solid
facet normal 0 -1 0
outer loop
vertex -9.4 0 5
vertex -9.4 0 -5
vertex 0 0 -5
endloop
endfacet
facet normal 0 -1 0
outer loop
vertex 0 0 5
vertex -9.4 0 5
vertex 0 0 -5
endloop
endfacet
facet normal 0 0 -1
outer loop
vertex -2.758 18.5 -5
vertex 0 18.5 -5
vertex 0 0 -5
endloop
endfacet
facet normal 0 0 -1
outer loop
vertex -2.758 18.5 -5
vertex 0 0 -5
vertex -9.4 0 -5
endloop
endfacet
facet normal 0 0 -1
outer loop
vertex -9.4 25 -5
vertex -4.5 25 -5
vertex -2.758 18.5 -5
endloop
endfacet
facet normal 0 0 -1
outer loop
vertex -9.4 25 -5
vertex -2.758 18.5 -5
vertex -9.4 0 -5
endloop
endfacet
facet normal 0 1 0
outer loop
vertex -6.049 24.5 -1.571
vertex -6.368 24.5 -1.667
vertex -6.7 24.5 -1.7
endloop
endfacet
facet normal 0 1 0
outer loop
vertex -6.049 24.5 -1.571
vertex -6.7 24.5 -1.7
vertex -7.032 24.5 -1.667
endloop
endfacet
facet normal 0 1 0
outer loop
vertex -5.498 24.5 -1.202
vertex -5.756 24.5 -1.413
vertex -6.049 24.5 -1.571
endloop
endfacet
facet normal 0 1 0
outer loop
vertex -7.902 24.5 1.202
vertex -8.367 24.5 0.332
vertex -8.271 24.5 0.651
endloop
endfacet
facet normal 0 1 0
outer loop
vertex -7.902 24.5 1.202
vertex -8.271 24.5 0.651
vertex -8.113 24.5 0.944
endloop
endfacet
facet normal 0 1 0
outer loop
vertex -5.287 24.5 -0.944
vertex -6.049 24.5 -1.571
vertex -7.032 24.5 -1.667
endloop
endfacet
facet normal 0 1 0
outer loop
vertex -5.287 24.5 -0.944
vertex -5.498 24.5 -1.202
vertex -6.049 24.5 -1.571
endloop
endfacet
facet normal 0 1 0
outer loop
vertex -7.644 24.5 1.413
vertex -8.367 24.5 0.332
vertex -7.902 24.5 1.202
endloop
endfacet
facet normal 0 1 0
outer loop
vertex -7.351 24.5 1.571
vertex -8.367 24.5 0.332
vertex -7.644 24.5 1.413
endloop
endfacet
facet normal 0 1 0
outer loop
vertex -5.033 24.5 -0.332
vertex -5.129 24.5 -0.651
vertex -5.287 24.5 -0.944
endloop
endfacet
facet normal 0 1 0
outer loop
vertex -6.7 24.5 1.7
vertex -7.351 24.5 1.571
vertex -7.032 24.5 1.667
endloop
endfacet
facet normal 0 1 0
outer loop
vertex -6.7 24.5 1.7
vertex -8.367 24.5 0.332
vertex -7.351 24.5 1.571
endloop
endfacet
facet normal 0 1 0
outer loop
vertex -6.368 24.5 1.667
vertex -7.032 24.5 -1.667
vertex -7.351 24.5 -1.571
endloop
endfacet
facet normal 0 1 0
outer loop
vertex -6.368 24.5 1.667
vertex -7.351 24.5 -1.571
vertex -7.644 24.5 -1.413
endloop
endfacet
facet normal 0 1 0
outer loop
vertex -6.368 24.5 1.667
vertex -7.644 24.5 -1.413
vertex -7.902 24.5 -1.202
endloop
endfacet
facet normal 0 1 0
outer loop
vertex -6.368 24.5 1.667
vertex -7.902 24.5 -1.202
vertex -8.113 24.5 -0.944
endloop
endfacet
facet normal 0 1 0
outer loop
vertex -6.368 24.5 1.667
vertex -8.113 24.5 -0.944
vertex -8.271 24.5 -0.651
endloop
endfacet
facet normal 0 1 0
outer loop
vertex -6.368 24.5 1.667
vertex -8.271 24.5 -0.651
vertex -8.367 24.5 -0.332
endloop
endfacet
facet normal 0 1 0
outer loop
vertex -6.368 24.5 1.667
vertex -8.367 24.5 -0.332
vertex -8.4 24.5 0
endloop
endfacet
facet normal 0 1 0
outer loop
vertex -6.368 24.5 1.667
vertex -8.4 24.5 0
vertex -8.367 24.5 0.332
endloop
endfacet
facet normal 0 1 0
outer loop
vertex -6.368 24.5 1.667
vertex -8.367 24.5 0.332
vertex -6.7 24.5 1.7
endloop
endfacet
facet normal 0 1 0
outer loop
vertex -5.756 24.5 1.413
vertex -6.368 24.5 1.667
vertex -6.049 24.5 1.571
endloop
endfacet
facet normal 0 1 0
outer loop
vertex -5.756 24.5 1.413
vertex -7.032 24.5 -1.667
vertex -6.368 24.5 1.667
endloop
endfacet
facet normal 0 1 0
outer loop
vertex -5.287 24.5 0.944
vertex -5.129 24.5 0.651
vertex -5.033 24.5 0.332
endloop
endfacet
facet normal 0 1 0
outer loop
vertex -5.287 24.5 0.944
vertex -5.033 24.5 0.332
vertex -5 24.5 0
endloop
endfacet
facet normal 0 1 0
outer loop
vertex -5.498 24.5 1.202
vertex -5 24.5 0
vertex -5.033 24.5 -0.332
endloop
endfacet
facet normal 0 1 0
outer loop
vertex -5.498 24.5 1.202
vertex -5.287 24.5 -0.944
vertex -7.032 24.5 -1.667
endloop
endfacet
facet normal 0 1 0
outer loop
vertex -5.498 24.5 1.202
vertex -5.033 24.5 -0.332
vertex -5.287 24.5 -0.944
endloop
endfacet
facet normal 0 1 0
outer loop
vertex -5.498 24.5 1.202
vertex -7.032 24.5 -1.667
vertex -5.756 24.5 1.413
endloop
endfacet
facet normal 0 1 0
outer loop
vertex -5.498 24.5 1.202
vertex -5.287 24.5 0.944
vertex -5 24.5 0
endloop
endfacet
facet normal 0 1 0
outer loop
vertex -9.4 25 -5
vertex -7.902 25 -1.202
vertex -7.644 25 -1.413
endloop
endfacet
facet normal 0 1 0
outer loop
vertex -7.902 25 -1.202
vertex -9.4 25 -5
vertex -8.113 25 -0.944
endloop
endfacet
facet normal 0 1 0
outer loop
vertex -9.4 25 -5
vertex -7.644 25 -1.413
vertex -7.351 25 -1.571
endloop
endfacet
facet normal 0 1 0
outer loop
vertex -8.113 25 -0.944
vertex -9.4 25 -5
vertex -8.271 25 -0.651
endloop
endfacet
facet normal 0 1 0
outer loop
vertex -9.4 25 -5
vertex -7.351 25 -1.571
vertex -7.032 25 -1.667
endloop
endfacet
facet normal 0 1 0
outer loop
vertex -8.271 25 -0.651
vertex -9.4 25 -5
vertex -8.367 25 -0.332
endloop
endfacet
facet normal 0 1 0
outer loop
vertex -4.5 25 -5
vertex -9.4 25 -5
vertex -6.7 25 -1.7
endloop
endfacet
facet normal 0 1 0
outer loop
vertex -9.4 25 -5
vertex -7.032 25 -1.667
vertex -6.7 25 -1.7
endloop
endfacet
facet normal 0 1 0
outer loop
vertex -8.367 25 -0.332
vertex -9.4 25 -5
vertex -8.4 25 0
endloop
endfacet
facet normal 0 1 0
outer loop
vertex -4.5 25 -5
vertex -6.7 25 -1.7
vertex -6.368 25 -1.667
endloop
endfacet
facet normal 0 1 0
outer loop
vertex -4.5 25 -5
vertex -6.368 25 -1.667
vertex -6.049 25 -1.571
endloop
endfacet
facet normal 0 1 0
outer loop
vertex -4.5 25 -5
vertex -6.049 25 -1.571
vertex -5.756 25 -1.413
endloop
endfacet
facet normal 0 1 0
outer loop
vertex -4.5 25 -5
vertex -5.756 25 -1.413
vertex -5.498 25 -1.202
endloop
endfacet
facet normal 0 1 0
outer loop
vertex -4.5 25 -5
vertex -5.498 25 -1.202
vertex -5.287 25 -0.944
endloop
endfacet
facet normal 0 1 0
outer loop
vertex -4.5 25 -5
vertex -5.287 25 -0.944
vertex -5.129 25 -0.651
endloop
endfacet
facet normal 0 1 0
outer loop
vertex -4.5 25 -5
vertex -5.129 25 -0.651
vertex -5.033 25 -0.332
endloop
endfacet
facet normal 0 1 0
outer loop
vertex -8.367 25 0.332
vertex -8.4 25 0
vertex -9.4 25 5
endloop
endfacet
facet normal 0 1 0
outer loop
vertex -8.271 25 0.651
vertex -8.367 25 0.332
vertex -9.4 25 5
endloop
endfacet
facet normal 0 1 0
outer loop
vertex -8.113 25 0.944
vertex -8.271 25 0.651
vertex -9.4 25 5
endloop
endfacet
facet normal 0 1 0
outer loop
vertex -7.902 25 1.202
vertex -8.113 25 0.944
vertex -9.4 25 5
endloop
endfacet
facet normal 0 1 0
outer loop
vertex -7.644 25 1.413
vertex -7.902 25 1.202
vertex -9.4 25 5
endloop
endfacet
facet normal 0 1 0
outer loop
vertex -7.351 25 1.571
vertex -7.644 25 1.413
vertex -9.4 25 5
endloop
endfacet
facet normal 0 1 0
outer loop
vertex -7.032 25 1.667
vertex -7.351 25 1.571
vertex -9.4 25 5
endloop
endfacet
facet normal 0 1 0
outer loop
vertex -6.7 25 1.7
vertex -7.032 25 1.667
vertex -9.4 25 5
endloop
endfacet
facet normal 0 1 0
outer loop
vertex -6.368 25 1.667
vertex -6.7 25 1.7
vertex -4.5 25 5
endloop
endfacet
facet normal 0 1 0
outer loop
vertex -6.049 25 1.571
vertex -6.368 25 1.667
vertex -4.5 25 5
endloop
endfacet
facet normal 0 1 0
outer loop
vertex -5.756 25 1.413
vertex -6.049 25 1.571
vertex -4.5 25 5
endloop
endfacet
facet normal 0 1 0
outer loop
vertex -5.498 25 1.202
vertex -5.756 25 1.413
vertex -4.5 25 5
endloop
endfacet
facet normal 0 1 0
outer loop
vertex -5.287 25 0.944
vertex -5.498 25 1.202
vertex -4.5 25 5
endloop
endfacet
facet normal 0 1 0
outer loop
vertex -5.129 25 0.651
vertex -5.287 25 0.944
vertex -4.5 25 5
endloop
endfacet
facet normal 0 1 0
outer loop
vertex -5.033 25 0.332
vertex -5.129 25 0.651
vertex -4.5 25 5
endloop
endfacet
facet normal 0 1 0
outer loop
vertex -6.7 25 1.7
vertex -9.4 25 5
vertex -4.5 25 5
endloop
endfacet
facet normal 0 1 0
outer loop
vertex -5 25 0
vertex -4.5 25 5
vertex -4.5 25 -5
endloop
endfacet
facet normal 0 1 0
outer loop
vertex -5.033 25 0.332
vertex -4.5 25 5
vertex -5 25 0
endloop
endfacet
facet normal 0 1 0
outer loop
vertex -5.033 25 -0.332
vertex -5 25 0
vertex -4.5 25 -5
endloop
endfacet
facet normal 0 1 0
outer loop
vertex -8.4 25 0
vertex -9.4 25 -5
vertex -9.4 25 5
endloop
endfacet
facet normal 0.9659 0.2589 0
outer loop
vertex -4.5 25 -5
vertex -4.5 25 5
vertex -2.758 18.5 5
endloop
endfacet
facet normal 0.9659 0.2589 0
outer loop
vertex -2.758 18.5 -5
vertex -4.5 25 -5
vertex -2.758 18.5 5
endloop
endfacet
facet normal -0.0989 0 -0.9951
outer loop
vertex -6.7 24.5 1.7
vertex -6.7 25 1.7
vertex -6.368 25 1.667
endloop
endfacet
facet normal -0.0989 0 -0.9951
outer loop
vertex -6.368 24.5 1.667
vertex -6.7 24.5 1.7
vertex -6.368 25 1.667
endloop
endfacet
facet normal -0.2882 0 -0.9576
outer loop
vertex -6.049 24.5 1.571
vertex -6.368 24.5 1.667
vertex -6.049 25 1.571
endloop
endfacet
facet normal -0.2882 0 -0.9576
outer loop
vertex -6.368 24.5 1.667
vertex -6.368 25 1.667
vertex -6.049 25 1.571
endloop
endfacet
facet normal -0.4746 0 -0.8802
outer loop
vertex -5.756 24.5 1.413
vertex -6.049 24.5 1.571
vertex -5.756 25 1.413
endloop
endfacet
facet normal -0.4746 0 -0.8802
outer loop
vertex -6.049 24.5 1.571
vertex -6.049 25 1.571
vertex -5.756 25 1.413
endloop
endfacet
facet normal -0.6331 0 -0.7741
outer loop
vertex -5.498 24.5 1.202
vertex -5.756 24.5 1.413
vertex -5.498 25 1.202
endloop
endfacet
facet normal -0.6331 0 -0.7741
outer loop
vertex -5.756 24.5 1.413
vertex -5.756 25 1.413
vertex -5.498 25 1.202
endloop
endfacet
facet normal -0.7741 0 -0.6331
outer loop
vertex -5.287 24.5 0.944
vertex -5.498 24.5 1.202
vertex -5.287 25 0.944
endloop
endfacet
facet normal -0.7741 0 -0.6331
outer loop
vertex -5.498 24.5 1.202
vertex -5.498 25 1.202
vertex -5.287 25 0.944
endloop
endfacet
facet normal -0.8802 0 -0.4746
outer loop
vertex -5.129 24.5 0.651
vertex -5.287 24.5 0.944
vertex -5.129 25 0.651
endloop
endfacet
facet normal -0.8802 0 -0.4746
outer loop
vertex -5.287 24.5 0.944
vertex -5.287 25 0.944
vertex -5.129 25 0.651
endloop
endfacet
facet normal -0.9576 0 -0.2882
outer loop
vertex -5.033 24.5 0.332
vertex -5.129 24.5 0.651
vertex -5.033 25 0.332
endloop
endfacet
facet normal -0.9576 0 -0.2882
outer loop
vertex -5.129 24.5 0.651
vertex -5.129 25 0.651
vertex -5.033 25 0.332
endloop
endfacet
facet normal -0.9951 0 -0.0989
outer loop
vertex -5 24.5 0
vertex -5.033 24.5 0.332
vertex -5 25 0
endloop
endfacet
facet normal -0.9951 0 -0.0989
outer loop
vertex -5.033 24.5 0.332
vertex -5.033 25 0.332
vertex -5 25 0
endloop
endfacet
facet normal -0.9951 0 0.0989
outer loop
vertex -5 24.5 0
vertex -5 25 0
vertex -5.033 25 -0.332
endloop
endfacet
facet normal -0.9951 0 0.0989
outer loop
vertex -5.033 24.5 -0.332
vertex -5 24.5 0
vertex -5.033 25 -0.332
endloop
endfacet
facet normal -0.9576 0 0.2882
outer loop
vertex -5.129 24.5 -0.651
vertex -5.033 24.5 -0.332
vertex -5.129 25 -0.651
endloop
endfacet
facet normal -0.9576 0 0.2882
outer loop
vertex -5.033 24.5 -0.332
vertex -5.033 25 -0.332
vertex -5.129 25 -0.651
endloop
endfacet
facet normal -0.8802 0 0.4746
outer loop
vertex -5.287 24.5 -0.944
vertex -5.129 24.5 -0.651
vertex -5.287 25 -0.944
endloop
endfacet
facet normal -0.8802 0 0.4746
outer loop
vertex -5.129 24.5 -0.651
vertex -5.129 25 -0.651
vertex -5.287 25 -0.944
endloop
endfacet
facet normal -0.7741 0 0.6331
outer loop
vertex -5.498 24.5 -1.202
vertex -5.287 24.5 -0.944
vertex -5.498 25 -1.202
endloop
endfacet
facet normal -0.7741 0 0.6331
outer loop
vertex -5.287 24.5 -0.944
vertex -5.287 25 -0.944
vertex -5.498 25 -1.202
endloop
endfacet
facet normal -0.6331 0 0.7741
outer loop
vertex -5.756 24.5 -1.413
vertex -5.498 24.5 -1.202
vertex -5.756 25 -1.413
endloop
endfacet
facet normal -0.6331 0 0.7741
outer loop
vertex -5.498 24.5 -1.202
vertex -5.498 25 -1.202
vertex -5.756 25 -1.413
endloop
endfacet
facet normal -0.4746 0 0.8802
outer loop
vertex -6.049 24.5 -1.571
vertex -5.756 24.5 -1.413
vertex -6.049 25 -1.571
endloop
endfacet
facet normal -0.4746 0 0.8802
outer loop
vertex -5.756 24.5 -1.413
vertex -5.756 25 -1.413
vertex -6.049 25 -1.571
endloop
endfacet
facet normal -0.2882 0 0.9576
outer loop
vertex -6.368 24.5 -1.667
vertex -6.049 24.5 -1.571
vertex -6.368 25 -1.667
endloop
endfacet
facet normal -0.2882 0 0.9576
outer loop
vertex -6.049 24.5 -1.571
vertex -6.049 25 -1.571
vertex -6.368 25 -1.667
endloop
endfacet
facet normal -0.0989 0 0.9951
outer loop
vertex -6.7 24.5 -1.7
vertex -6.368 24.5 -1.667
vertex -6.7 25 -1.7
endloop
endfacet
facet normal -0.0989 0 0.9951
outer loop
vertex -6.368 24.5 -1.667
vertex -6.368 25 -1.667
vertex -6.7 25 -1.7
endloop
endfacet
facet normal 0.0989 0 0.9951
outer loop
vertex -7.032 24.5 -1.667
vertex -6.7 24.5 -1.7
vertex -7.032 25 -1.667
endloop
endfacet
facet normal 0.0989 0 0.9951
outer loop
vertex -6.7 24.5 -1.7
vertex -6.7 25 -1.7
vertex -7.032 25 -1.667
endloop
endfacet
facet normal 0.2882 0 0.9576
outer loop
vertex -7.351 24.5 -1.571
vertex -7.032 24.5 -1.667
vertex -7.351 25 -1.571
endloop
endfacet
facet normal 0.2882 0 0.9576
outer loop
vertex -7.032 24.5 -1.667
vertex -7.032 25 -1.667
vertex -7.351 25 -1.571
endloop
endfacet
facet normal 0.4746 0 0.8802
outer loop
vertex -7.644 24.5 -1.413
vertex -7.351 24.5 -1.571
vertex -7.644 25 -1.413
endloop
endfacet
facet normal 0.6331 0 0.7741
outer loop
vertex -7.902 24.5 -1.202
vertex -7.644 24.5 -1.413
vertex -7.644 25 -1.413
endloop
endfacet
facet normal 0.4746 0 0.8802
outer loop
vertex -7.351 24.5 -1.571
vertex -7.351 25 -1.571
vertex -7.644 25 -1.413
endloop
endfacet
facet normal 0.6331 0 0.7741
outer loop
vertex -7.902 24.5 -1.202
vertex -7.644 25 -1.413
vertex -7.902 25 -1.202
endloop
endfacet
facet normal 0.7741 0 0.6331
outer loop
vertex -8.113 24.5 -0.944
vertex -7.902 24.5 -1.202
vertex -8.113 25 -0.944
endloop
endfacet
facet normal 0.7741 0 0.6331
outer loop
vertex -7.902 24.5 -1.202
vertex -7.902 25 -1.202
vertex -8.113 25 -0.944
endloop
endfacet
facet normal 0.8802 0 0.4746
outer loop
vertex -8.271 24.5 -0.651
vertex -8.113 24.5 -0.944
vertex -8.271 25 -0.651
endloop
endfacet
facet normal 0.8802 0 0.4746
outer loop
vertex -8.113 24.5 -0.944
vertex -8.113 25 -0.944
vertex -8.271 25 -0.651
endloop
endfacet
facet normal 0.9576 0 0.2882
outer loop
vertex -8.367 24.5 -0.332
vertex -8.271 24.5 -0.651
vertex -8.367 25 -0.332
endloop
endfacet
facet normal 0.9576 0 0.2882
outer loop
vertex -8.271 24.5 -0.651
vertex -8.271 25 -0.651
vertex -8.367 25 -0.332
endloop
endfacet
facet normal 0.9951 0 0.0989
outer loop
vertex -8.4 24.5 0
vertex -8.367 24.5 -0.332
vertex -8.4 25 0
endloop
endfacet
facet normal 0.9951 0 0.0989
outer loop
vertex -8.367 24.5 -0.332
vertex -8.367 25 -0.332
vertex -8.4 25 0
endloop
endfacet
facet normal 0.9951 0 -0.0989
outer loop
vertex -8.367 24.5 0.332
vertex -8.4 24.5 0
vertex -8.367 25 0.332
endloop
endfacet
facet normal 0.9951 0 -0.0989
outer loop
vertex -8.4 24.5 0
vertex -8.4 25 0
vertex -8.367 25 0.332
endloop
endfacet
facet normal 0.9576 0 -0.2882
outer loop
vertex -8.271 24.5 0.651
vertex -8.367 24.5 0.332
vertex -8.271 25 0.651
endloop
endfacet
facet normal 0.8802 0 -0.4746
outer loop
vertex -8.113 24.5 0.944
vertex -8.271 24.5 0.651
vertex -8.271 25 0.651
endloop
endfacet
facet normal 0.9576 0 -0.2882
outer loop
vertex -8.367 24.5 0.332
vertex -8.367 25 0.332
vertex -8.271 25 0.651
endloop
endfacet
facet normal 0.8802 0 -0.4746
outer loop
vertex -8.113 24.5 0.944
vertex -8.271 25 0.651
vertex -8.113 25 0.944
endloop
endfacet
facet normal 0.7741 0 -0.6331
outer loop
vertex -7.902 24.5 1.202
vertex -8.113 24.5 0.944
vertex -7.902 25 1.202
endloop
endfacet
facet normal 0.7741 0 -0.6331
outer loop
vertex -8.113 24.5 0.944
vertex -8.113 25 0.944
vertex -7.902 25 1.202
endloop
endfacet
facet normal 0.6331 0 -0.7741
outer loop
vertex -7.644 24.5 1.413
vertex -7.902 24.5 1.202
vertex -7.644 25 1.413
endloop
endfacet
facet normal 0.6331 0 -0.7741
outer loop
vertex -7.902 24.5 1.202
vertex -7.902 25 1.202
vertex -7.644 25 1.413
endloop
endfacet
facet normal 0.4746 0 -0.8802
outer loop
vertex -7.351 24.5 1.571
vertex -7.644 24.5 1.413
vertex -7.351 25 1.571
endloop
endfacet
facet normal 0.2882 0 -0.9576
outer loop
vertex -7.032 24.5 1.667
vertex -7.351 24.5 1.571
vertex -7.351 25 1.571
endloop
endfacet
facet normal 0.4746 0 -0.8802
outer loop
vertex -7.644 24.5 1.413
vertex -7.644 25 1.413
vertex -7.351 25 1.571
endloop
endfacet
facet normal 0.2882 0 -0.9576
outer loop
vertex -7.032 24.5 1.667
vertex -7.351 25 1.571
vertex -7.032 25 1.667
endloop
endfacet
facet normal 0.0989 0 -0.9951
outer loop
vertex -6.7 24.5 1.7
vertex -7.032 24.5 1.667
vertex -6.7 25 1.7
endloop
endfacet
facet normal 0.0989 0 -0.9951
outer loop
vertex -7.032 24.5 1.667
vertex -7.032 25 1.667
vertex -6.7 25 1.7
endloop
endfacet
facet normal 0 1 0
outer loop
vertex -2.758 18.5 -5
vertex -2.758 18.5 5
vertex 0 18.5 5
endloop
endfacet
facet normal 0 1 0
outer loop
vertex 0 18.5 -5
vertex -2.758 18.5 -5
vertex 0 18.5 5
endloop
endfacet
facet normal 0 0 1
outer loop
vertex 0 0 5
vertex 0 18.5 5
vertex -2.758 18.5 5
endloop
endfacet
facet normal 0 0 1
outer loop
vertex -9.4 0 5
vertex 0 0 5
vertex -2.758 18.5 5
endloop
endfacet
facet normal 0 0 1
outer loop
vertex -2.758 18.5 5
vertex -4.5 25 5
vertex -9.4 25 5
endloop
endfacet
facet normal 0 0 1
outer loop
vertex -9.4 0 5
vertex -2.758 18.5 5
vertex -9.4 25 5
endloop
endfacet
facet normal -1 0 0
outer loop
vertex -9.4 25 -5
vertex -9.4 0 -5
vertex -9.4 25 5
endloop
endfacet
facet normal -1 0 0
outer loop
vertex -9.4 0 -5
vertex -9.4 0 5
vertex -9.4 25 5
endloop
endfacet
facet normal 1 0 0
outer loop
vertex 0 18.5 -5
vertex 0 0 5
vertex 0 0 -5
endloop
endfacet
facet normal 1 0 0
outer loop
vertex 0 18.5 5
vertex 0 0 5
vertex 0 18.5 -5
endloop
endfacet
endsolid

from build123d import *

# Parameters (mm, degrees)
BASE_SKETCH_W          = 9.4
BASE_SKETCH_H          = 18.5
BASE_DEPTH             = 5
BASE_TOP_DEPTH         = 5
MAN_OP_CUTOUT_SKETCH_R = 1.7
MAN_OP_CUTOUT_DEPTH    = 0.5


with BuildPart() as part:
    # Base Sketch → Base (new, symmetric)
    with BuildSketch(Plane.XY):
        with Locations((-4.7, 9.25)):
            Rectangle(BASE_SKETCH_W, BASE_SKETCH_H)
    extrude(amount=BASE_DEPTH, both=True)

    # Base Top Sketch → Base Top (add, symmetric)
    with BuildSketch(Plane.XY):
        Polygon((-2.758330249, 18.5), (-9.4, 18.5), (-9.4, 25), (-4.5, 25), align=None)
    extrude(amount=BASE_TOP_DEPTH, both=True)

    # Man-op cutout sketch → Man-op cutout (cut)
    with BuildSketch(Plane(origin=(0, 25, 0), x_dir=(-1, 0, 0), z_dir=(0, 1, 0))):
        with Locations(Location((6.7, 0, 0), (0, 0, 90))):
            Circle(MAN_OP_CUTOUT_SKETCH_R)
    extrude(amount=-MAN_OP_CUTOUT_DEPTH, mode=Mode.SUBTRACT)


solid = part.part
